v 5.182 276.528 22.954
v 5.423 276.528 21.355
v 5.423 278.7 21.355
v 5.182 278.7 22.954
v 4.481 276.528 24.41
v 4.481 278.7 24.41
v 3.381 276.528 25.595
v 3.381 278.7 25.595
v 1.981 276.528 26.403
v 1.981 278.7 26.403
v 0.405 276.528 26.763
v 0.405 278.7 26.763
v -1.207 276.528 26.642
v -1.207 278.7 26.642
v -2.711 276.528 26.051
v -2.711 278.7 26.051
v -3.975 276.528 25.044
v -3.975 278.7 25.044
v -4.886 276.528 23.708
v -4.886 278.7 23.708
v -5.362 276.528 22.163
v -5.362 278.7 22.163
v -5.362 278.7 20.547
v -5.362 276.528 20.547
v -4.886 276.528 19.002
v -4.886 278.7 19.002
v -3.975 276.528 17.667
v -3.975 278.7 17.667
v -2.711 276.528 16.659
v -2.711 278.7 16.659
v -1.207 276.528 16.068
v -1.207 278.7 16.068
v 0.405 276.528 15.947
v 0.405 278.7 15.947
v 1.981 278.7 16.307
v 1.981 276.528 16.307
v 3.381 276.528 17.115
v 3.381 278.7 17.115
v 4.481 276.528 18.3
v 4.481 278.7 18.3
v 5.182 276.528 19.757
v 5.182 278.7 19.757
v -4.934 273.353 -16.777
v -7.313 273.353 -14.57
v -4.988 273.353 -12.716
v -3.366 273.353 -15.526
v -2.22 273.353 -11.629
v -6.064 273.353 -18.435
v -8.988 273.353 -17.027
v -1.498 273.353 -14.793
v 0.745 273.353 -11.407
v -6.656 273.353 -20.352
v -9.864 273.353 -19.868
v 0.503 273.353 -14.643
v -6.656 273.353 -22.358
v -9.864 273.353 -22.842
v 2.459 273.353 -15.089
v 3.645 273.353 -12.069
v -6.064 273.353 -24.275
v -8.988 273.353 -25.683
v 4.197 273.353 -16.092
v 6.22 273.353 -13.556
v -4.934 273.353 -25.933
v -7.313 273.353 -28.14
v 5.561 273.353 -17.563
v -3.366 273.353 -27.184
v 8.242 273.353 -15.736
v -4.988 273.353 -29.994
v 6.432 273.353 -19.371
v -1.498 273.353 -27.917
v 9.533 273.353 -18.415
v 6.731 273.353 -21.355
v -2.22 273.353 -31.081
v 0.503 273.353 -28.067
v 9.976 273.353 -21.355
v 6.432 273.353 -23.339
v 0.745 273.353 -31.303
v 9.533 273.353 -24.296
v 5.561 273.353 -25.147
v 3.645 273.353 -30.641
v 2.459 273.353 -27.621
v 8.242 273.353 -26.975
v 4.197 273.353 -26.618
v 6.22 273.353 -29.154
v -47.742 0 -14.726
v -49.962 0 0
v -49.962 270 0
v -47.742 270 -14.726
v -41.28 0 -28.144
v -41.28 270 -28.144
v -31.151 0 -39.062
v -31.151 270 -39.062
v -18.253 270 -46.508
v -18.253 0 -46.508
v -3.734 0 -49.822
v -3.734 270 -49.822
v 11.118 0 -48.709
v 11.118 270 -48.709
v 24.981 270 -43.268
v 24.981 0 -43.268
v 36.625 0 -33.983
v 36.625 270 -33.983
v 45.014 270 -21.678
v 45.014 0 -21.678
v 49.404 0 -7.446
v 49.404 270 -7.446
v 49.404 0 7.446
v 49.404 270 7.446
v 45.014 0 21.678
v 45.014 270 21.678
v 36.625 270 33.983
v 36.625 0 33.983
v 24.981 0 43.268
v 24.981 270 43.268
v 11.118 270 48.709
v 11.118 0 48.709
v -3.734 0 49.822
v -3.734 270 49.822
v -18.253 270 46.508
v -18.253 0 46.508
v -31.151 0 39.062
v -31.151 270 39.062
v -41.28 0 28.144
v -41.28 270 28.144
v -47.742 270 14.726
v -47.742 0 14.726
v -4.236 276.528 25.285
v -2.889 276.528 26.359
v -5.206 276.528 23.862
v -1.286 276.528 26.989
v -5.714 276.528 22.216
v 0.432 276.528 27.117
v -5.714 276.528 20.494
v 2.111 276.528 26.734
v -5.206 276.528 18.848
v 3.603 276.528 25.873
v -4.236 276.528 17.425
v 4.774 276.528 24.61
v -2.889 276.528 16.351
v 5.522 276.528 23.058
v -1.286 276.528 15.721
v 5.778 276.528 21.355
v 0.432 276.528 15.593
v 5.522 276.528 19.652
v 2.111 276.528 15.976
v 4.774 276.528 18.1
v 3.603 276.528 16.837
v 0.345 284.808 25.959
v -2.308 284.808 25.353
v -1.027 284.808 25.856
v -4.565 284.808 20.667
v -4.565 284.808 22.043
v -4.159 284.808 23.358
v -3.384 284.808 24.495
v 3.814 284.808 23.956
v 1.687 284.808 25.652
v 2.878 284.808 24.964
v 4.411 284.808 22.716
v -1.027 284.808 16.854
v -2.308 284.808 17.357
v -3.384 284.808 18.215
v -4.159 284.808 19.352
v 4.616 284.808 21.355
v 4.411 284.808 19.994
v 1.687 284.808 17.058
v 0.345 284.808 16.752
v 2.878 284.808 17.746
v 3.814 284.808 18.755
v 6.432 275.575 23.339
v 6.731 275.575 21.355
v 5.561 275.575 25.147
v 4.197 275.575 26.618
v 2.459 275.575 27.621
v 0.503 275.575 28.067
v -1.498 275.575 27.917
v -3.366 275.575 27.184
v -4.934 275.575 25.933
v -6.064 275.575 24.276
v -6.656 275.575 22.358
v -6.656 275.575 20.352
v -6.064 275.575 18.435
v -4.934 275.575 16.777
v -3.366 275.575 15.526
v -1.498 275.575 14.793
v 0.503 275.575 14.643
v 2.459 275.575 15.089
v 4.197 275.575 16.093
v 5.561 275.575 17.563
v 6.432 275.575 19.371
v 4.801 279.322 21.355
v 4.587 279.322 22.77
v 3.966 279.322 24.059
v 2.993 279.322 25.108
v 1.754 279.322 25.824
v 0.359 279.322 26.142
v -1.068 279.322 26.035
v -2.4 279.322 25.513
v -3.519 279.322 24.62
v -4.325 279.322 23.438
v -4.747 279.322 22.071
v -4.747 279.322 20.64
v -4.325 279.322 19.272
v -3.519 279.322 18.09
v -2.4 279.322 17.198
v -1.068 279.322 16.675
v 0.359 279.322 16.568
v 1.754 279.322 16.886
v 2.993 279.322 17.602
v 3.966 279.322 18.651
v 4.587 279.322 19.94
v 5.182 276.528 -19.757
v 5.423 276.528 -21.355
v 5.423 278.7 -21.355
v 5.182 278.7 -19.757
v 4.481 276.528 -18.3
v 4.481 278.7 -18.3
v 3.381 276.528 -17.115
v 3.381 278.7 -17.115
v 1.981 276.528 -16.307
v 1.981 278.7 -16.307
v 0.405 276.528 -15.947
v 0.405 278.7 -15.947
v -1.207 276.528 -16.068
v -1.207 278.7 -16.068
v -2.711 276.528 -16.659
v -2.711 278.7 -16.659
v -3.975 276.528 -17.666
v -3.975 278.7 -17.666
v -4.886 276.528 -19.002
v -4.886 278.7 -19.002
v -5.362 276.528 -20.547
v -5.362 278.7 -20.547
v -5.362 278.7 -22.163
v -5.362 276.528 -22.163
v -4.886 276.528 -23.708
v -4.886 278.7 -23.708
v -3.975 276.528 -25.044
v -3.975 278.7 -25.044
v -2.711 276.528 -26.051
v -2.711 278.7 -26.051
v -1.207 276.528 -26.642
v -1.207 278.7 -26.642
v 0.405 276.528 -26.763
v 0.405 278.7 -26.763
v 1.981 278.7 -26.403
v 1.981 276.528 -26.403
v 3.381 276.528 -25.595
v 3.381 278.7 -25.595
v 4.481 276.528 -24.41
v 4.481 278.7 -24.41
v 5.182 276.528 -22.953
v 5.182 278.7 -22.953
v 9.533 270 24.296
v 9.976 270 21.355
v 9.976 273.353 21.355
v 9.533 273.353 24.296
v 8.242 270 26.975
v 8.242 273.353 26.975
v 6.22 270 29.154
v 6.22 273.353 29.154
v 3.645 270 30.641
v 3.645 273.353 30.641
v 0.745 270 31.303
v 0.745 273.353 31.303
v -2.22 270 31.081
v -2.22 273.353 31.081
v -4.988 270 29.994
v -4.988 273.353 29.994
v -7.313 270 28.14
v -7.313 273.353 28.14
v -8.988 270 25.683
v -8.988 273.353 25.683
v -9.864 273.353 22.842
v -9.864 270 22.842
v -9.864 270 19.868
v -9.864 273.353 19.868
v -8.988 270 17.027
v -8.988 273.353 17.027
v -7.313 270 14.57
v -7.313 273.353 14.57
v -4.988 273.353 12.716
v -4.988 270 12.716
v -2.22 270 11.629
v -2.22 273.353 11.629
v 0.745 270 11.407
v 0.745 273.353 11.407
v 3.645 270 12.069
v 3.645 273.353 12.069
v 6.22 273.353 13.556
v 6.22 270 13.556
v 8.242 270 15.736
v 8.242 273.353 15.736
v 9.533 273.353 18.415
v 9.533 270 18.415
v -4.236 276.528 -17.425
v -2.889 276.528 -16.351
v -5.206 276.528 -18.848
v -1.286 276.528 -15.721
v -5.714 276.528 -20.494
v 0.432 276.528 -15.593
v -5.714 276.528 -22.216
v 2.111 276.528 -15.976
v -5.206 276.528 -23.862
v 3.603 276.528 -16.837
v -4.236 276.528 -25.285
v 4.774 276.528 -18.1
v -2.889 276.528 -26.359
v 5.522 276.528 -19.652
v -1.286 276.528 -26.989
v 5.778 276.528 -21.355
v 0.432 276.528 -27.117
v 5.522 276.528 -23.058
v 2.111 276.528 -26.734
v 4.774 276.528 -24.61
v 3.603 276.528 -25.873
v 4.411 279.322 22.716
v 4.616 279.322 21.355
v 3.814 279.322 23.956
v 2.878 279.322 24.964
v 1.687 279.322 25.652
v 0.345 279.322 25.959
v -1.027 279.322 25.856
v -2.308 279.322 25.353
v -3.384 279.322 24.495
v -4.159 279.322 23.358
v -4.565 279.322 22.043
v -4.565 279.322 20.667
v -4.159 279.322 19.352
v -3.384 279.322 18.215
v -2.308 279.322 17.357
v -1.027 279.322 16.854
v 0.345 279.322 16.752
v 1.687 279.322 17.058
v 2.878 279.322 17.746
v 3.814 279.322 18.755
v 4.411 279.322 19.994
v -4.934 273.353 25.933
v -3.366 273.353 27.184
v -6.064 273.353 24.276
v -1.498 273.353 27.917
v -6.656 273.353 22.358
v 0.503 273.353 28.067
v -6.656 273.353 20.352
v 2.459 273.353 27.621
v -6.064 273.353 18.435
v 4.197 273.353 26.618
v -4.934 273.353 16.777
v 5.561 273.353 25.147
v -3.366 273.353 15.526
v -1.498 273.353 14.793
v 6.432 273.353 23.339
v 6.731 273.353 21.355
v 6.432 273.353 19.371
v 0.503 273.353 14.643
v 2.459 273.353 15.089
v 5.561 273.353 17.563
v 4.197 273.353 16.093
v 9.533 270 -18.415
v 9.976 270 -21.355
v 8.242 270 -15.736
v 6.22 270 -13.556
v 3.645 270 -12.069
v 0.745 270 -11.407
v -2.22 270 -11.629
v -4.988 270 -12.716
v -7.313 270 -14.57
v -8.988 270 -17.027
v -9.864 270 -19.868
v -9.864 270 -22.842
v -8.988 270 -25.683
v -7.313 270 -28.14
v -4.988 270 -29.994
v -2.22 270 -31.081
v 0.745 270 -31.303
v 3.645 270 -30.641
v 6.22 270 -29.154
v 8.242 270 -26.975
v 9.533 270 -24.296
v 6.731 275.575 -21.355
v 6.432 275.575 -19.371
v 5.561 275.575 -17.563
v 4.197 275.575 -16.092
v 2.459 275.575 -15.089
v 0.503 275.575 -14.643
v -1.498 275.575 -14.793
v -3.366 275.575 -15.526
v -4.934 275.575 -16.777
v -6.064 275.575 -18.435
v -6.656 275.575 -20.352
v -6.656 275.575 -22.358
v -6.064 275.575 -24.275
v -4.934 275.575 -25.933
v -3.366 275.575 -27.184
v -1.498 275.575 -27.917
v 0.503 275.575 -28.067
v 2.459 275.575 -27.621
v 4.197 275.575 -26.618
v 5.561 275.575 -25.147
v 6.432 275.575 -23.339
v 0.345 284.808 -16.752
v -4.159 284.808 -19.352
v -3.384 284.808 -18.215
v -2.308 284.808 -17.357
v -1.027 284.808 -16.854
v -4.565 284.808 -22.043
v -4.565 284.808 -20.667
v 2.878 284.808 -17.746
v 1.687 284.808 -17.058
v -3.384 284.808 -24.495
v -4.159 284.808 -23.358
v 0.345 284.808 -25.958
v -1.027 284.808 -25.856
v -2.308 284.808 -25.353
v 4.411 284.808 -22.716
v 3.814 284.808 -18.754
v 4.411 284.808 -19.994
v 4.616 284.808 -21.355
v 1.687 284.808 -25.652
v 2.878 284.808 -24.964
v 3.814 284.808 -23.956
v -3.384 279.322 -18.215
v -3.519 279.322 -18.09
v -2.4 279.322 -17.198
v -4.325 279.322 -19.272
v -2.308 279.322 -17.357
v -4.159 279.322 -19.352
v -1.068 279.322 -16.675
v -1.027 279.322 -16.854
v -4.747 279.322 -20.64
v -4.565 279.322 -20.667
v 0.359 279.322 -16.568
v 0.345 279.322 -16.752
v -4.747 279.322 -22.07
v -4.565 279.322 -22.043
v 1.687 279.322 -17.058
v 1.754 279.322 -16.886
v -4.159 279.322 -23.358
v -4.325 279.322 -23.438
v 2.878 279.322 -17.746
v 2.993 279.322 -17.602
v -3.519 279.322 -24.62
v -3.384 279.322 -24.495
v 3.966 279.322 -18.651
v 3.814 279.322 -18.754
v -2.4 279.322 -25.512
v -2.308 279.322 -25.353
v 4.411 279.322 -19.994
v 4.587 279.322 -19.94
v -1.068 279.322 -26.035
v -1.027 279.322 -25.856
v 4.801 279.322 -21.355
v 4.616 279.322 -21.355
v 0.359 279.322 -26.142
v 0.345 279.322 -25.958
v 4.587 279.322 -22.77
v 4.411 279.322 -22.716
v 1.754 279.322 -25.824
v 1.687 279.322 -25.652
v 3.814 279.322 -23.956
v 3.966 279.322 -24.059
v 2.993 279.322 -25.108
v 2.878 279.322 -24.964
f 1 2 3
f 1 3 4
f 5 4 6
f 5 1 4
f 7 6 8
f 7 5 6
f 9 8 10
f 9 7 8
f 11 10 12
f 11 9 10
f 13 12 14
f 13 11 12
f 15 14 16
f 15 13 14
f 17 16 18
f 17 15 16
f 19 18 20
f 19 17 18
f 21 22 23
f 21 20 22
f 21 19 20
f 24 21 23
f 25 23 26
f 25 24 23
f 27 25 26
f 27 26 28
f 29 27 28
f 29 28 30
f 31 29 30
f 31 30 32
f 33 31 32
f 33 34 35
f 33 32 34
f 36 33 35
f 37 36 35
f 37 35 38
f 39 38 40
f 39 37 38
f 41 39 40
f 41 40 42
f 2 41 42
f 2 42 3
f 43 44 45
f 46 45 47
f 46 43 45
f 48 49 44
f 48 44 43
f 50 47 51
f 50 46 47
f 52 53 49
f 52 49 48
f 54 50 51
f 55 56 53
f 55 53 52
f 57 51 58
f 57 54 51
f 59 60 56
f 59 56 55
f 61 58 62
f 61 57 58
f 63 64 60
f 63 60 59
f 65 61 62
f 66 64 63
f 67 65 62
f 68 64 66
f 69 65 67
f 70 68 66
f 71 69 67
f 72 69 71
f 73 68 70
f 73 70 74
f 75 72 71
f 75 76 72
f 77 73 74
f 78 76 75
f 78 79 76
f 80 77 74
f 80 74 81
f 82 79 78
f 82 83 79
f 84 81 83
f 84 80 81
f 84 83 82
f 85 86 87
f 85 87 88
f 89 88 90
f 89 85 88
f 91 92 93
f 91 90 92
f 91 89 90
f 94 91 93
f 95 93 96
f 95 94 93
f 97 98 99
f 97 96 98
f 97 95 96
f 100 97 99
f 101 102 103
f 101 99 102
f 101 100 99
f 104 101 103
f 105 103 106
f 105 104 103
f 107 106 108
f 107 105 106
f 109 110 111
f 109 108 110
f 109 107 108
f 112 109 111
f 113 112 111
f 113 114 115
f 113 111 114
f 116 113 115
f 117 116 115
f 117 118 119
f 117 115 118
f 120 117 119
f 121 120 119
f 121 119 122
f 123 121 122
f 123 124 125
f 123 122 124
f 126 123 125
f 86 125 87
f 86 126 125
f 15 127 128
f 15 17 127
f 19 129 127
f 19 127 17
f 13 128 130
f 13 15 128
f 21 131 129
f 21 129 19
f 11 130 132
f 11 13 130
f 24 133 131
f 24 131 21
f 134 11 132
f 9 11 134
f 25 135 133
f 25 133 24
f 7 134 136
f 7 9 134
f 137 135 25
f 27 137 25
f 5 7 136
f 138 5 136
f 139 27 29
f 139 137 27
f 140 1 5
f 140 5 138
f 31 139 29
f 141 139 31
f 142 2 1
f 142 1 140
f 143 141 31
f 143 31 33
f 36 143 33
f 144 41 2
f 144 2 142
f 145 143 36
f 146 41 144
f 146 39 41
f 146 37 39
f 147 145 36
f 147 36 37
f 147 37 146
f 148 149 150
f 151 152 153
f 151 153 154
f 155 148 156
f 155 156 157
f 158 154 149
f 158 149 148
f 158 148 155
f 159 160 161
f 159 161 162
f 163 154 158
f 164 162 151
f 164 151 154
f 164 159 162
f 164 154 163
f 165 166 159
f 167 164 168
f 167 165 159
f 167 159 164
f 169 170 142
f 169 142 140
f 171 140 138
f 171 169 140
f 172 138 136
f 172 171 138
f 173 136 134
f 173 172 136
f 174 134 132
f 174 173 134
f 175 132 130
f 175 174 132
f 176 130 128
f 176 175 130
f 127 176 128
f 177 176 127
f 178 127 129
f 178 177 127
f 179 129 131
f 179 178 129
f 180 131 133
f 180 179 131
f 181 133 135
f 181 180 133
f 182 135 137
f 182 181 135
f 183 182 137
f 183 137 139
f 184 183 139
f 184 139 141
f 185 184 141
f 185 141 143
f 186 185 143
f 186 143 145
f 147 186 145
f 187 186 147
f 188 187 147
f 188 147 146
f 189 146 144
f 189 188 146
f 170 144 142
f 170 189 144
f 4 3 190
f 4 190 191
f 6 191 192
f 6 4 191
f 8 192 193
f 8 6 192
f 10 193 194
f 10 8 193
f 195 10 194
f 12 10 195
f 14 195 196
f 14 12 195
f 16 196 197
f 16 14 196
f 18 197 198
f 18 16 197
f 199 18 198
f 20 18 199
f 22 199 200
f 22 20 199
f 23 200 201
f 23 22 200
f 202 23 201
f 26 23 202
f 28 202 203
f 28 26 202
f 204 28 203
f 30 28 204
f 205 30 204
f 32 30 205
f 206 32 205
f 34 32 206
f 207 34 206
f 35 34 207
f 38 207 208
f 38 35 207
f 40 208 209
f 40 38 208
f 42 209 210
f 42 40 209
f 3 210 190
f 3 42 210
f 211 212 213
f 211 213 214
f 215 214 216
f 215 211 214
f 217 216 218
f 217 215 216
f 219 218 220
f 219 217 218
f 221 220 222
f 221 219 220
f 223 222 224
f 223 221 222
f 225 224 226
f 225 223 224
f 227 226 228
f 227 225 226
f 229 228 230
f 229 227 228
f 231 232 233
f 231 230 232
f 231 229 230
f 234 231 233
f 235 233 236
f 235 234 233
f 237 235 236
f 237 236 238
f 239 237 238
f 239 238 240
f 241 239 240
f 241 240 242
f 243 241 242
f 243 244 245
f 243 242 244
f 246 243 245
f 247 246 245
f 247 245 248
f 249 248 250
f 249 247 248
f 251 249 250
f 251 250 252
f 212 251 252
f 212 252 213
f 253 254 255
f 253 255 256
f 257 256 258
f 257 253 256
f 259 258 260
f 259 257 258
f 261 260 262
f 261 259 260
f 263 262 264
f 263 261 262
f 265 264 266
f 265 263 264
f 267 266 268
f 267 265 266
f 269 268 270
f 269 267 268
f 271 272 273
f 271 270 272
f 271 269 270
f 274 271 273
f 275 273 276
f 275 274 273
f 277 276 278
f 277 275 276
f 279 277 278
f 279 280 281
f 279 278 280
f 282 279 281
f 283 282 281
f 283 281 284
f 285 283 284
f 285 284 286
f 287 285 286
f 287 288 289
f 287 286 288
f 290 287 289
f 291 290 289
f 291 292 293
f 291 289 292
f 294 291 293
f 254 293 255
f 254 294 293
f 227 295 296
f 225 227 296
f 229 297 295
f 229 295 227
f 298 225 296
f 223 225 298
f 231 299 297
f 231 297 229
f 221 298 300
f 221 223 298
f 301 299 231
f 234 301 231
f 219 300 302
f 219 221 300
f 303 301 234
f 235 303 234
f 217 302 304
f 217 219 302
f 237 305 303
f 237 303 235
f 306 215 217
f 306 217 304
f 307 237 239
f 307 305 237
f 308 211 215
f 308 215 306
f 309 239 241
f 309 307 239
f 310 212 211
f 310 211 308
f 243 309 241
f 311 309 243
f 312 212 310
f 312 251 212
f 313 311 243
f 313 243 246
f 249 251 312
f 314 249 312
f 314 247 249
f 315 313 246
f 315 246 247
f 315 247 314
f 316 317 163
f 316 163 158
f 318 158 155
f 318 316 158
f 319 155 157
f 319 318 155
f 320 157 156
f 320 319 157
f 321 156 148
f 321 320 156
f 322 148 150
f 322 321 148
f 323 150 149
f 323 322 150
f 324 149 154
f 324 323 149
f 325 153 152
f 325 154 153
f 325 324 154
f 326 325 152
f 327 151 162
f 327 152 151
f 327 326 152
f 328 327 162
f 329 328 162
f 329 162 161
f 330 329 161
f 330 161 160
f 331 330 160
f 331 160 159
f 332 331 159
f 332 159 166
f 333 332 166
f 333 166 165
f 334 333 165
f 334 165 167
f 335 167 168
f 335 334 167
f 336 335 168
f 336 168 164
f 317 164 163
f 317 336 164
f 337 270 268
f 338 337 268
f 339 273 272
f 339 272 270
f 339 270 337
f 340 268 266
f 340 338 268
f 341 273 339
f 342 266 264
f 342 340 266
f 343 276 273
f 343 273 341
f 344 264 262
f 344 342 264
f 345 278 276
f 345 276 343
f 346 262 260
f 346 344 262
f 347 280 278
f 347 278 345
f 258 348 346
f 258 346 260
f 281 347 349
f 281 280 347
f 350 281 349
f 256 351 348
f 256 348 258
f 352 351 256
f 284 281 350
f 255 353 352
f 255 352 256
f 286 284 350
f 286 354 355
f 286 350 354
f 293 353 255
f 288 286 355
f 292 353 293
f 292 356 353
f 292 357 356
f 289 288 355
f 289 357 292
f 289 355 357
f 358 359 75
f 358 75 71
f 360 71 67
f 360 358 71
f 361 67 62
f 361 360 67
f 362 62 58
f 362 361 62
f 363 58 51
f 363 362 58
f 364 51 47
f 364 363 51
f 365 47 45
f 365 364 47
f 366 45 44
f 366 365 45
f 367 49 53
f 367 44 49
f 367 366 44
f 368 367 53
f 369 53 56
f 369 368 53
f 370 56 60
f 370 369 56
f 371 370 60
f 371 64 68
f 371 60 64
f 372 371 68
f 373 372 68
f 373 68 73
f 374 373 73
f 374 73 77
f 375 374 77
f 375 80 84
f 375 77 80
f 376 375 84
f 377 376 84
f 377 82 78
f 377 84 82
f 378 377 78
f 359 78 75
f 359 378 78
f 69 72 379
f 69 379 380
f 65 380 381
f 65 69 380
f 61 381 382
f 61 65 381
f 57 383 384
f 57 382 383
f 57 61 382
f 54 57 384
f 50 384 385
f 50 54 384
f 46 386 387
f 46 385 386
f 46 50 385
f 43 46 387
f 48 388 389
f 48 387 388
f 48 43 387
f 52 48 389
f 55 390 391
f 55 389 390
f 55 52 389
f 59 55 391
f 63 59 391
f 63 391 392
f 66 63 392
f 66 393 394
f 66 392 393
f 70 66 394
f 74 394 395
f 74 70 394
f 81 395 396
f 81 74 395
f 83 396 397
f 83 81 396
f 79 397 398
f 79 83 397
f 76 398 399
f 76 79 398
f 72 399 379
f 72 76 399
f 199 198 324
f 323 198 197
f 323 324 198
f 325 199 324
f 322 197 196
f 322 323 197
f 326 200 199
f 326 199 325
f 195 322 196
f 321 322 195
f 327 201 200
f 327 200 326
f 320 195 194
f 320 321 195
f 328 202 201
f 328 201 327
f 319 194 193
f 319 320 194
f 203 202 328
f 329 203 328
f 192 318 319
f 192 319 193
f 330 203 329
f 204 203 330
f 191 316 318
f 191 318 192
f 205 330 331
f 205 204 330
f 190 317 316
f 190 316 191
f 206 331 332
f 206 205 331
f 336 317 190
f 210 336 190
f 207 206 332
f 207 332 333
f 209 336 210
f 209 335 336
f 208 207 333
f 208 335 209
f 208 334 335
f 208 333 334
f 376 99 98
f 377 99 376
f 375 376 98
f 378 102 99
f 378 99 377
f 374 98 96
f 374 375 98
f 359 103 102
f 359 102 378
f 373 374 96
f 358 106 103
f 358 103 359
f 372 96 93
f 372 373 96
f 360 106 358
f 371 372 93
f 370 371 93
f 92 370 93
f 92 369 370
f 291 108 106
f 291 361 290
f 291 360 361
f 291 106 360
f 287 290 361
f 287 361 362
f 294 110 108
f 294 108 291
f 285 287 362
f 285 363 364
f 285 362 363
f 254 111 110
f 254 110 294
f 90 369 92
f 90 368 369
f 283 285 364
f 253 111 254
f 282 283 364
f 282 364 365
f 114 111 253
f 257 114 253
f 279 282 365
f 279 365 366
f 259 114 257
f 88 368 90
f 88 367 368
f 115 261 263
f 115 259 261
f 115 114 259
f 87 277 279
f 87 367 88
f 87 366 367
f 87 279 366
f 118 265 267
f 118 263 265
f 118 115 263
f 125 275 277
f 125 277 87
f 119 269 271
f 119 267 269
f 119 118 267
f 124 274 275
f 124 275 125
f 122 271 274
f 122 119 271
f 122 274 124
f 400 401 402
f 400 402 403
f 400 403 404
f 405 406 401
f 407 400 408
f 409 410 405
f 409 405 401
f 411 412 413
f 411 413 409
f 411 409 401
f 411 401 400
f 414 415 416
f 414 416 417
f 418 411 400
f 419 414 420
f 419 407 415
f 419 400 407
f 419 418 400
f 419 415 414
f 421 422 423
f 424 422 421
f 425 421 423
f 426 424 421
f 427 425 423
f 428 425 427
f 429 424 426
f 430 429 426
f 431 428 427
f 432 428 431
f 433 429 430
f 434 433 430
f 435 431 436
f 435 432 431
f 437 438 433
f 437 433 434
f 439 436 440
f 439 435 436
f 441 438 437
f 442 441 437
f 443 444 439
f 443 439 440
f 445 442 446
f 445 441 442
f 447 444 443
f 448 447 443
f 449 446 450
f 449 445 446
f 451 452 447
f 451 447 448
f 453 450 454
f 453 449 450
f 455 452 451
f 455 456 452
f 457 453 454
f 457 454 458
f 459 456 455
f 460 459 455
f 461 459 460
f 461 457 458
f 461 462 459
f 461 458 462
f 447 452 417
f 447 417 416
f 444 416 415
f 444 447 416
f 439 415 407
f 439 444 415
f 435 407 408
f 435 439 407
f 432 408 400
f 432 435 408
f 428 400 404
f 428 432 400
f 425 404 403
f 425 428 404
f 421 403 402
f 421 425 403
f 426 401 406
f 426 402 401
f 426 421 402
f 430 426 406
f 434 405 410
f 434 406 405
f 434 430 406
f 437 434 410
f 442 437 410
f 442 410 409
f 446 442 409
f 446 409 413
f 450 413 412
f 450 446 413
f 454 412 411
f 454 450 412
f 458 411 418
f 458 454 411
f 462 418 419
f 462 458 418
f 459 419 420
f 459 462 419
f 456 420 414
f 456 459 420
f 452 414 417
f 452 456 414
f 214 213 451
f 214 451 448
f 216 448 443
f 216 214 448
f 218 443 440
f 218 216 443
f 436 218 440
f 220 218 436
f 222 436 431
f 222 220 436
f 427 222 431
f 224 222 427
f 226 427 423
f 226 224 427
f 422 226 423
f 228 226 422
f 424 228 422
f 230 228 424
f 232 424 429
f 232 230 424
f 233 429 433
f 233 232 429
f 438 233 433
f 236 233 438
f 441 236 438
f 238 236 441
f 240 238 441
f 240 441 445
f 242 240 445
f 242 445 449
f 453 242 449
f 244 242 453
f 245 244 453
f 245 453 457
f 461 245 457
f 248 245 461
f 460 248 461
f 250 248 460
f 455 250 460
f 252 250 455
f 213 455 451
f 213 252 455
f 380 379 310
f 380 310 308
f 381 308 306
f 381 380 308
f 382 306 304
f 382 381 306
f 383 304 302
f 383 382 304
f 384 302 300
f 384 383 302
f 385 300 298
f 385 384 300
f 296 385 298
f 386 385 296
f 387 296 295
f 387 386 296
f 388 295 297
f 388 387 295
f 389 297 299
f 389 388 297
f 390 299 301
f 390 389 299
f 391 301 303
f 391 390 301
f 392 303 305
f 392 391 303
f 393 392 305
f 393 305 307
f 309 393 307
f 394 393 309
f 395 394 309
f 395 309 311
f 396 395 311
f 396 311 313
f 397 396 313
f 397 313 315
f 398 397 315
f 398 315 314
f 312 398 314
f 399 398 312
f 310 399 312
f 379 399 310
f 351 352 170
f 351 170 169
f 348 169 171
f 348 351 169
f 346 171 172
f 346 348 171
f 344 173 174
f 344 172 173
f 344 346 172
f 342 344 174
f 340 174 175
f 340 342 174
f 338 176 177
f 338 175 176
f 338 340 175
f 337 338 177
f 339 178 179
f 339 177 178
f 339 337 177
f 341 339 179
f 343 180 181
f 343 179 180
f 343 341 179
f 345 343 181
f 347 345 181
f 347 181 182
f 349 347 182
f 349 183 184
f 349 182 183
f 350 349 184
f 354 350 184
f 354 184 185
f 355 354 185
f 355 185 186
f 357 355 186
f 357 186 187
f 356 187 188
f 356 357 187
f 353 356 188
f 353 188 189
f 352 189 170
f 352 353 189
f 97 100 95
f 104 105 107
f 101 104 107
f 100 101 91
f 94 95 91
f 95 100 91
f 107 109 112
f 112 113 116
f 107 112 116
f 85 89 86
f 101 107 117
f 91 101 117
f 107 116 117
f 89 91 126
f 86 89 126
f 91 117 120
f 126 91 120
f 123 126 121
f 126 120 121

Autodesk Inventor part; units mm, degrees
ref_plane "YZ Plane" through (0, 0, 0) normal (1, 0, 0) x (0, 1, 0)
ref_plane "XZ Plane" through (0, 0, 0) normal (0, 1, 0) x (-1, 0, 0)
ref_plane "XY Plane" through (0, 0, 0) normal (0, 0, 1) x (1, 0, 0)
sketch "Sketch1" plane through (0, 0, 0) normal (0, 1, 0) x (-1, 0, 0)
  circle A0 centre (0, 0) radius 49.9618
  dimension "Diameter" = 99.9236
extrude "Extrusion1" add sketch "Sketch1" along normal blind 270
sketch "Sketch2" plane through (0, 270, 0) normal (0, 1, 0) x (1, 0, 0)
  circle A0 centre (0, -21.3551) radius 9.9758
  circle A1 centre (0, 21.3551) radius 9.9758
  line L0 (0, -21.3551) -> (0, 21.3551) construction
  point P0 (0, 0)
  point P1 (0, 0)
  dimension "d3" = 19.9517
  dimension "d6" = 42.7101
extrude "Extrusion2" add sketch "Sketch2" along normal blind 3.3528
sketch "Sketch3" plane through (0, 273.3528, 21.3551) normal (0, 1, 0) x (1, 0, 0)
  circle A0 centre (0, 42.7101) radius 9.9758 construction
  circle A1 centre (0, 0) radius 9.9758 construction
  circle A2 centre (0, 42.7101) radius 6.731
  circle A3 centre (0, 0) radius 6.731
  point P0 (0, 21.3551)
  dimension "d7" = 13.462
extrude "Extrusion3" add sketch "Sketch3" along normal blind 3.175
sketch "Sketch4" plane through (0, 276.5278, 21.3551) normal (0, 1, 0) x (1, 0, 0)
  circle A0 centre (0, 42.7101) radius 6.731 construction
  circle A1 centre (0, 0) radius 6.731 construction
  circle A2 centre (0, 42.7101) radius 5.4229
  circle A3 centre (0, 0) radius 5.4229
  point P0 (0, 21.3551)
  dimension "d10" = 10.8458
extrude "Extrusion4" add sketch "Sketch4" along normal blind 2.794
sketch "Sketch5" plane through (0, 279.3218, 21.3551) normal (0, 1, 0) x (1, 0, 0)
  circle A0 centre (0, 42.7101) radius 5.4229 construction
  circle A1 centre (0, 0) radius 5.4229 construction
  circle A2 centre (0, 42.7101) radius 4.6164
  circle A3 centre (0, 0) radius 4.6164
  point P0 (0, 21.3551)
  dimension "d13" = 9.2329
extrude "Extrusion5" add sketch "Sketch5" along normal blind 5.4864
thread "Thread1" size "9/16-28 UN" class "2A" standard "ANSI Unified Screw Threads" full length
thread "Thread2" size "9/16-28 UN" class "2A" standard "ANSI Unified Screw Threads" full length
chamfer "Chamfer1" distance 0.9525 angle 45 2 edges at (-6.731, 276.5278, -21.3551) (-6.731, 276.5278, 21.3551)
chamfer "Chamfer2" distance 0.6223 angle 45 2 edges at (-5.4229, 279.3218, 21.3551) (-5.4229, 279.3218, -21.3551)
properties part number "3.5F_Cap" material "Aluminum 6061"
